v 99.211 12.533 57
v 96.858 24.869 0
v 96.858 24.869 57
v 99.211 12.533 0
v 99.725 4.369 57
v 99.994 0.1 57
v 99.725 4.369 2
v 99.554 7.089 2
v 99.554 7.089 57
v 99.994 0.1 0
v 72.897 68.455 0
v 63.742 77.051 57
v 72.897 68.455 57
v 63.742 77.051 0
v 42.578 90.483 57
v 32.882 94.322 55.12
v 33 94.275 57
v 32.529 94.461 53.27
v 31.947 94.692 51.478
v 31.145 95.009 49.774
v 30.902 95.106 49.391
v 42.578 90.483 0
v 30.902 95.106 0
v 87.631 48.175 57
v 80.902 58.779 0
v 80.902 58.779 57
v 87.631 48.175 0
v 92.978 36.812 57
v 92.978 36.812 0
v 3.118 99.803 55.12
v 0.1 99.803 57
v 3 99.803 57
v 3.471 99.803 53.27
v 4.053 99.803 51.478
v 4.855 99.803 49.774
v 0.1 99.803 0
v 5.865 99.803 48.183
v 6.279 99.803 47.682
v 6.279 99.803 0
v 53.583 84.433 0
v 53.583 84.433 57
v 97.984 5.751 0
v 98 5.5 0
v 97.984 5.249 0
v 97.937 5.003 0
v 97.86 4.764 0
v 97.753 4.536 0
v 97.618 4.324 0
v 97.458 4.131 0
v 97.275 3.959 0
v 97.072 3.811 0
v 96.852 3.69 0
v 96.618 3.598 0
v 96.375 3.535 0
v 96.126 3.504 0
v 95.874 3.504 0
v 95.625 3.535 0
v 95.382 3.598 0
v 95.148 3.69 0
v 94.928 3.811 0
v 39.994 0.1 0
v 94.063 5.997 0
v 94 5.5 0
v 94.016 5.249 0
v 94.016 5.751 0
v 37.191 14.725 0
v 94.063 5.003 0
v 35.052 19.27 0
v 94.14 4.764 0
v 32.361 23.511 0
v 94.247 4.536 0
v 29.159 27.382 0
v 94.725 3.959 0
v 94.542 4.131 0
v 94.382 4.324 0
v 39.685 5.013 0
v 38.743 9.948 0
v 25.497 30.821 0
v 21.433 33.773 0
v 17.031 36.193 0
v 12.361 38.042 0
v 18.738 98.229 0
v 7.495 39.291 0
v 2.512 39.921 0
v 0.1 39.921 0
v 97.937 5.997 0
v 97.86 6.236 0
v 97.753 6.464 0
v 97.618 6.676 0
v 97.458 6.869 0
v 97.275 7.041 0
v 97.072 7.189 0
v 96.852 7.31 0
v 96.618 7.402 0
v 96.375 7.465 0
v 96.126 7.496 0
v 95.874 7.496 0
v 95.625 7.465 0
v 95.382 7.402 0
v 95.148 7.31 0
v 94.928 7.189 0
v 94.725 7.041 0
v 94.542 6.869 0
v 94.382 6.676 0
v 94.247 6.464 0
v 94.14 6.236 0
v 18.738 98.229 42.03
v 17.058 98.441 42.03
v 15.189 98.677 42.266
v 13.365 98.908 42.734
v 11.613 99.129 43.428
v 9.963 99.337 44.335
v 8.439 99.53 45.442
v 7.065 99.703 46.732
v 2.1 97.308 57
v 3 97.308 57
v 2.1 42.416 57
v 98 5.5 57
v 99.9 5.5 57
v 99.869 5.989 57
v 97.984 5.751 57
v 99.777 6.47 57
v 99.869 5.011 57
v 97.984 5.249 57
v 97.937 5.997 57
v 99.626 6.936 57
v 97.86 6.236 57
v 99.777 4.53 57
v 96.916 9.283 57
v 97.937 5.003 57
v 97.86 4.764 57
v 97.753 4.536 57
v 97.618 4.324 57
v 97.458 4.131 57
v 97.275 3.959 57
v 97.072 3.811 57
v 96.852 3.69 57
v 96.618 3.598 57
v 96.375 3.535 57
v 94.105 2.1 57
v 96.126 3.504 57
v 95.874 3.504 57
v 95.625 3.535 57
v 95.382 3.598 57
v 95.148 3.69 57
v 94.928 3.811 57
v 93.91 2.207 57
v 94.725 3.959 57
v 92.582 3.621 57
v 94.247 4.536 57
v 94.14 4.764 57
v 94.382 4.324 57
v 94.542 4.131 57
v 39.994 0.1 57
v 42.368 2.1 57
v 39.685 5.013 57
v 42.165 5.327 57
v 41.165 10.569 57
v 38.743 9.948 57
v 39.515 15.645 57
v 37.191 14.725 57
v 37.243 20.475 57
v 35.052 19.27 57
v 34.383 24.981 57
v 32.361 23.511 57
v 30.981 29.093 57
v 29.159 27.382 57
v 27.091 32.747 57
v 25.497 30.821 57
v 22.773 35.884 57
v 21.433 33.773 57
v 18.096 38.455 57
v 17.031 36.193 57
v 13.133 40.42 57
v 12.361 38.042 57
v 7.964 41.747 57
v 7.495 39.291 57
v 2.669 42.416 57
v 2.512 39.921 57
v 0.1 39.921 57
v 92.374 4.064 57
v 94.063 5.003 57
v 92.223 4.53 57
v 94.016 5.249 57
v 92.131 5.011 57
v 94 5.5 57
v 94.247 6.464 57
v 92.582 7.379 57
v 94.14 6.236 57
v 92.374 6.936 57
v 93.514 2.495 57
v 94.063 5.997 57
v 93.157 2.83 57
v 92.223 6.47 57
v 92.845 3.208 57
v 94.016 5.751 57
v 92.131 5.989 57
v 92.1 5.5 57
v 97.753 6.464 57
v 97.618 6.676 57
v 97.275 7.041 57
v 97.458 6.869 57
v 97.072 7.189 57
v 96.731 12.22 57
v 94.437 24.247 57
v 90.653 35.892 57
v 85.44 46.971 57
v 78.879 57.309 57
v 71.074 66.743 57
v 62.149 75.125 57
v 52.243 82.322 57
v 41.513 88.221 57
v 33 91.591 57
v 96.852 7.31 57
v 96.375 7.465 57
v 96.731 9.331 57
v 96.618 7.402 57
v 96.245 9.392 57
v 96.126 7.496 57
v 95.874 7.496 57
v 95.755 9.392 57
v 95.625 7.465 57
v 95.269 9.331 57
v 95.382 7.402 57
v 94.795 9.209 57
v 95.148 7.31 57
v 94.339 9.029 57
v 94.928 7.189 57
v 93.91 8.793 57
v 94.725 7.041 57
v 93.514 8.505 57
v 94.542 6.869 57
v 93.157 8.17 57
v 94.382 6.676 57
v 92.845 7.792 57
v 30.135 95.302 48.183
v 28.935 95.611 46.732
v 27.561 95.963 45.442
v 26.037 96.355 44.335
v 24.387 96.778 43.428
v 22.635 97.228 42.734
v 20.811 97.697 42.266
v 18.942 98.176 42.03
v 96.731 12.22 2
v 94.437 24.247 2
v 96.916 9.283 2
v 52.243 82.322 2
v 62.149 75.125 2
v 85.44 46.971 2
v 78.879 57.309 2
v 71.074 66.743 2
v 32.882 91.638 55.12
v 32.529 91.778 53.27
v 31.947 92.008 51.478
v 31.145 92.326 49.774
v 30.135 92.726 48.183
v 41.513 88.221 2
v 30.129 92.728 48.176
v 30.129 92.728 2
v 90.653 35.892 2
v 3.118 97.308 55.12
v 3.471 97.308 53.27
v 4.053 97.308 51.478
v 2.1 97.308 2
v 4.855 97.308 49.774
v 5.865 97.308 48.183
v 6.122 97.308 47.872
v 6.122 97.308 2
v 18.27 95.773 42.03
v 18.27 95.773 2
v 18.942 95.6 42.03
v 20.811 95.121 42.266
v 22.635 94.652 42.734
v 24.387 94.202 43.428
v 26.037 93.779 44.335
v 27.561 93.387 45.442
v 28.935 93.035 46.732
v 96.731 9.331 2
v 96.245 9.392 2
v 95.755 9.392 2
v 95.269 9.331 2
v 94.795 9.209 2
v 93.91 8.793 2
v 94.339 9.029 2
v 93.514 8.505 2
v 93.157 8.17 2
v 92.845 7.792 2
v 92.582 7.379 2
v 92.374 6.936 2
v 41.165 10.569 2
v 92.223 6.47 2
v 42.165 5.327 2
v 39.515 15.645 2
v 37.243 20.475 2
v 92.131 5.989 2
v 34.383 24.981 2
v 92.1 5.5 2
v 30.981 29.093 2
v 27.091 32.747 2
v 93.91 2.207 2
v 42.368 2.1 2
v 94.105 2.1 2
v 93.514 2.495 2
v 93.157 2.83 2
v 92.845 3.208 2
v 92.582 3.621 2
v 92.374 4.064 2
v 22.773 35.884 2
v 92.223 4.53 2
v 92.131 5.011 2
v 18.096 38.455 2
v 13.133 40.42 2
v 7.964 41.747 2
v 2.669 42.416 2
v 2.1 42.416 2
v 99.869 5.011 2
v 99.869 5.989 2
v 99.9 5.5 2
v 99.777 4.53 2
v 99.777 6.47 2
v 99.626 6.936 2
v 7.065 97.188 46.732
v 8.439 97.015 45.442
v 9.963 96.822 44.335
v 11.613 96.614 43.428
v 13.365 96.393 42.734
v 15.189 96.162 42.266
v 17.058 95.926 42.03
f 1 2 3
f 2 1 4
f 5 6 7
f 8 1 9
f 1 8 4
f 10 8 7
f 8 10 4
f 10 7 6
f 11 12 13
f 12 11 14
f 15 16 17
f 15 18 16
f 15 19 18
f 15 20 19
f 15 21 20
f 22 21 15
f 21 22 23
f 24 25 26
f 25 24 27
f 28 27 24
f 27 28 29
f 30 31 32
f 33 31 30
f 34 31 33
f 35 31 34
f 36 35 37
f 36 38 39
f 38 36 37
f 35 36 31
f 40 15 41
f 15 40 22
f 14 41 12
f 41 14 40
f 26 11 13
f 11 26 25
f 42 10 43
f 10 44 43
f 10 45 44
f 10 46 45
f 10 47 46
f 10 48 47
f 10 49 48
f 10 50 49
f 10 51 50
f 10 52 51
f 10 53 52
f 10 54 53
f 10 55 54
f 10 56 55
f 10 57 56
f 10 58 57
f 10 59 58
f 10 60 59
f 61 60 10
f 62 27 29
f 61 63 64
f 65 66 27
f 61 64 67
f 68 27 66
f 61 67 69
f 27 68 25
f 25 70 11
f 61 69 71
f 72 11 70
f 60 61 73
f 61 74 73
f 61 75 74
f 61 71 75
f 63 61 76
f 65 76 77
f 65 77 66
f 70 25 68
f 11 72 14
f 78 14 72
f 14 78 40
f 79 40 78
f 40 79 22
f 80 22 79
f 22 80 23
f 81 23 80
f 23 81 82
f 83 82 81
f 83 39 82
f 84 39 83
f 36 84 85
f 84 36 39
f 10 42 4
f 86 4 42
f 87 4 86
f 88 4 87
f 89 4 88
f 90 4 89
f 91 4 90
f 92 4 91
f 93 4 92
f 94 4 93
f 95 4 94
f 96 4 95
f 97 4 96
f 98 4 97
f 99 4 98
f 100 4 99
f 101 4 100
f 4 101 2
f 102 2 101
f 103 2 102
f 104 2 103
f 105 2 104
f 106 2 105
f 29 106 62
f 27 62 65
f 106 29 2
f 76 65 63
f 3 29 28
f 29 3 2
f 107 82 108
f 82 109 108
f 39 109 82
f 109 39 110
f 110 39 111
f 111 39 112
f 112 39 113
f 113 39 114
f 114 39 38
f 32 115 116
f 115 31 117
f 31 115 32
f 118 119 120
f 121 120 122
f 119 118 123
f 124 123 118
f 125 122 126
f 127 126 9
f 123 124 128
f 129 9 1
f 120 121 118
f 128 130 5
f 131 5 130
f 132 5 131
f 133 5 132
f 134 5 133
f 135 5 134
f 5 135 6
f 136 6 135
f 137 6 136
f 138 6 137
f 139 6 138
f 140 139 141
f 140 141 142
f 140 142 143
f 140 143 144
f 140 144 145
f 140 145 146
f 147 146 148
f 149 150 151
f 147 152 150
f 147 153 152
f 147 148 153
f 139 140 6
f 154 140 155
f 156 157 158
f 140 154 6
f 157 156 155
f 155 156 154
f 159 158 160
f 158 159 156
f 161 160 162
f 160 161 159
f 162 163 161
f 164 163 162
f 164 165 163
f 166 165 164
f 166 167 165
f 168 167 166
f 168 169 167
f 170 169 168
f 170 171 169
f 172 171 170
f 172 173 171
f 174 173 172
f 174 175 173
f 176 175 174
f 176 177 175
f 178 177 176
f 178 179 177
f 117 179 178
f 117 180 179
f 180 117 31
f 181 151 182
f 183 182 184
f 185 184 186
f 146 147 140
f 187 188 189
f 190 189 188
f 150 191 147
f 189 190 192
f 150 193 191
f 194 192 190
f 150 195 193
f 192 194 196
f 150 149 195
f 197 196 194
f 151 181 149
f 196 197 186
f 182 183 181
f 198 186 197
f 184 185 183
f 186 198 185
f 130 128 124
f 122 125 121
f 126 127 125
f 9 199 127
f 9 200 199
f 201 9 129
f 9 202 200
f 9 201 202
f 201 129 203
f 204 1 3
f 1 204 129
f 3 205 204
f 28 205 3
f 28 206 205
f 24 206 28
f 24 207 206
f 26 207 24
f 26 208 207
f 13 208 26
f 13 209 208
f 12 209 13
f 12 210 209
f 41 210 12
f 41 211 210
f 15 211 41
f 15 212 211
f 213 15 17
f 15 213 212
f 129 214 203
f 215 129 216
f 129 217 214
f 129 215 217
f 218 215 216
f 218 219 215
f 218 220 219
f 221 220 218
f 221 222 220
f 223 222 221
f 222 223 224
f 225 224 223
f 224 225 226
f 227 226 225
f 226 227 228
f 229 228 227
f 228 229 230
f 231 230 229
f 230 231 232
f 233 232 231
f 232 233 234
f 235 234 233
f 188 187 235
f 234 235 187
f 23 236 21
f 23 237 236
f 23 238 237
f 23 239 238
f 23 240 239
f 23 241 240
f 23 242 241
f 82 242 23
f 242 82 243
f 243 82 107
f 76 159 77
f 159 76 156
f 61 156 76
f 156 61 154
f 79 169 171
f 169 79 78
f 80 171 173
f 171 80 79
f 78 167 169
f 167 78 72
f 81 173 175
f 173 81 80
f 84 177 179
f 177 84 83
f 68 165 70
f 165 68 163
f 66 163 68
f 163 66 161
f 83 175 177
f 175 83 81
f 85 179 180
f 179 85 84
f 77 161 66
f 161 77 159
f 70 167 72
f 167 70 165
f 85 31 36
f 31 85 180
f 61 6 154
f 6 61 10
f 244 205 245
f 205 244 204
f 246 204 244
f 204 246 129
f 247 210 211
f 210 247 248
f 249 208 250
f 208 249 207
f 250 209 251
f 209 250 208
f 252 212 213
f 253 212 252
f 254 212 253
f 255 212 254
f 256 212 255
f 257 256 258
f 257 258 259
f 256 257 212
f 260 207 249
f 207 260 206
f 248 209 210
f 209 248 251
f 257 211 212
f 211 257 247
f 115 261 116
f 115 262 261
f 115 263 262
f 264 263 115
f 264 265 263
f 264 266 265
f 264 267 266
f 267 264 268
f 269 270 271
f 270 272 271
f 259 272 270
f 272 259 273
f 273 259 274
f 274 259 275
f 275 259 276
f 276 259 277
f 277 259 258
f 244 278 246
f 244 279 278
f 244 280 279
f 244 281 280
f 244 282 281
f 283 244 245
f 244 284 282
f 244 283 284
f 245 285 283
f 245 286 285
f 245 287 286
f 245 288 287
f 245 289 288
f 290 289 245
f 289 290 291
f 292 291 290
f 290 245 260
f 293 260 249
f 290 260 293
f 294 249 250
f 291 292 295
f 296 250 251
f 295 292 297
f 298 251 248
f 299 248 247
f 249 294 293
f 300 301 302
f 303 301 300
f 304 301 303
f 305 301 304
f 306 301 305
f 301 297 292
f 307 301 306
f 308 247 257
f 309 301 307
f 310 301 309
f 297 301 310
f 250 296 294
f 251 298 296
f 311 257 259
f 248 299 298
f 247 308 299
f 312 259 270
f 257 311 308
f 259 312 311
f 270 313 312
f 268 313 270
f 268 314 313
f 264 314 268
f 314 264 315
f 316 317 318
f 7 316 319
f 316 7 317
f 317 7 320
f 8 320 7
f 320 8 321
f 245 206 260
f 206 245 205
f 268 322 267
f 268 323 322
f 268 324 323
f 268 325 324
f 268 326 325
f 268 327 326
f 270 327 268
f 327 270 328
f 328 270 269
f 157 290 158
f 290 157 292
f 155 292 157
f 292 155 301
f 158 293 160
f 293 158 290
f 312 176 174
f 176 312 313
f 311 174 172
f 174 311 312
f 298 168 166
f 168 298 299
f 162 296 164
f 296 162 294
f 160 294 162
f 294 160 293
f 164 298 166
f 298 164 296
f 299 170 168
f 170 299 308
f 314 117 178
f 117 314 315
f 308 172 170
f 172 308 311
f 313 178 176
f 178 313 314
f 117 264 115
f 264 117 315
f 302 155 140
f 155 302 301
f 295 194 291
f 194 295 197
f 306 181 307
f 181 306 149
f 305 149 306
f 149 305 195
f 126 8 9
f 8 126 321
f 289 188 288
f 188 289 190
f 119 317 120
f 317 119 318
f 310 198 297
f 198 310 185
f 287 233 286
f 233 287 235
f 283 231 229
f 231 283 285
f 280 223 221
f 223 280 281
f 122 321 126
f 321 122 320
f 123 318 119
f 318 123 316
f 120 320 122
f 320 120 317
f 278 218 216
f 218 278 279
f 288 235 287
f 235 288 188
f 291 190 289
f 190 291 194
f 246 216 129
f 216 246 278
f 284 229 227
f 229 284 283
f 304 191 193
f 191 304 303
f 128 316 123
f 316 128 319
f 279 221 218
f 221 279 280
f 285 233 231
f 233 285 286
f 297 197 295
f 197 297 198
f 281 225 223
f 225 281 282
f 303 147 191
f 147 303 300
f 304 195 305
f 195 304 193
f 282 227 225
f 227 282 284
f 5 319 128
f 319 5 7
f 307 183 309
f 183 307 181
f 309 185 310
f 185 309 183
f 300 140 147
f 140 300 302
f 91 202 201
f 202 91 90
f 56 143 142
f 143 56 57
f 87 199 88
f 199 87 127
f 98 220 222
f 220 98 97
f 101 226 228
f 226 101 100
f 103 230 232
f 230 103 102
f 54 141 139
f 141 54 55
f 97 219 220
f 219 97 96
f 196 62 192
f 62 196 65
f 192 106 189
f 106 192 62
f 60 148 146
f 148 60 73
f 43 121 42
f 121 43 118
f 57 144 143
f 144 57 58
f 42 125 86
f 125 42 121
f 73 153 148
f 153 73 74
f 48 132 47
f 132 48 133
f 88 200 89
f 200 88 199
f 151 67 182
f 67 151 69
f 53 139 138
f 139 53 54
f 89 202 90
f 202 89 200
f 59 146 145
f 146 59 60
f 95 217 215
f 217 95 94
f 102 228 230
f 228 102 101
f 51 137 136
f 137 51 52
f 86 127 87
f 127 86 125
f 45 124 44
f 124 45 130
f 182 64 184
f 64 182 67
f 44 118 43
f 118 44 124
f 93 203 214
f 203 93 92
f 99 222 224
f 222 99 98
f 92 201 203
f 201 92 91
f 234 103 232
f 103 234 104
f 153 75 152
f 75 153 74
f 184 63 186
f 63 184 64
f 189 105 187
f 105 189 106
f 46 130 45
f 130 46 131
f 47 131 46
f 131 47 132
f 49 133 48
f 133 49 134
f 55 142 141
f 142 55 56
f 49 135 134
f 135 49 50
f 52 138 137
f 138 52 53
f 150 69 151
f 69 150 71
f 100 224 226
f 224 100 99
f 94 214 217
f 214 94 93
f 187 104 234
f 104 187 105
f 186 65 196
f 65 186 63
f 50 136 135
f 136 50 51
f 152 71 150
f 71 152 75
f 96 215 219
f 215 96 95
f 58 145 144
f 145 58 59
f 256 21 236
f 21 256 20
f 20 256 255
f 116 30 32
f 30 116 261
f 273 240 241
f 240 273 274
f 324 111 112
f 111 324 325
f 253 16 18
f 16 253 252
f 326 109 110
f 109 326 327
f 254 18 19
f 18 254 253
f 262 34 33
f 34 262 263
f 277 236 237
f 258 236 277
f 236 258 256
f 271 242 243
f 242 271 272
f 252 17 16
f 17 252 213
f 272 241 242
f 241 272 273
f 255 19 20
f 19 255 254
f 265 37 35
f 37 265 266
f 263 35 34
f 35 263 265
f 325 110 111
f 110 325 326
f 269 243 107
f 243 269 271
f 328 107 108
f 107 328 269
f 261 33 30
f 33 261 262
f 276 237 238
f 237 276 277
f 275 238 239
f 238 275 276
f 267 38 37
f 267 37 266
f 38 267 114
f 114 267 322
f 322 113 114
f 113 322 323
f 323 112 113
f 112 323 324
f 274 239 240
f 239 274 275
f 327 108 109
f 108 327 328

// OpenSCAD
inner_diameter = 80;
outer_diameter = 200;
height = 57;
gauge = 2;
hole_diameter = 4;
hole_x = 96;
hole_y = 5.5;
post_location = [hole_x, hole_y, gauge];

$fn = 50;

difference() {
    union() {
        // Make the box
        difference() {
            make_quarter(inner_diameter, outer_diameter, height, 0);
            translate([0, 0, gauge]) {
                make_quarter(inner_diameter+5, outer_diameter-5, height, gauge);
            }
        }

        // add the hinge casing
        translate(post_location) {
            cylinder(d=7.8, h=height-gauge);
        }
    }

    // make the hinge hole
    translate(post_location) {
        translate([0, 0, -4]) {
            // d=4 for #8, 3.5 for #6, although 4 works well for #6 on my setup
            cylinder(d=hole_diameter, h=height+10);
        }
    }
    
    // cutout a finger hole for opening the drawer
    translate([18, 100, height]) {
        rotate([90, 0, 0]) {
            cylinder(d=30, h=10);
        }
    }
}


module make_quarter(inner, outer, h, inset) {
    
difference() {
    cylinder(d=outer, h=h);
    translate([0,0,-1]) {
        cylinder(d=inner, h=h+2);
    }
    rotate([0, 0, 90]) {
        translate([-0.1 - inset, -0.1 - inset, -1]) {
            cube([150, 150, h+2]);
        }
    }
    rotate([0, 0, 180]) {
        translate([-0.1 - inset, -0.1 - inset, -1]) {
            cube([150, 150, h+2]);
        }
    }
    rotate([0, 0, 270]) {
        translate([-0.1 - inset, -0.1 - inset, -1]) {
            cube([150, 150, h+2]);
        }
    }
}
}
